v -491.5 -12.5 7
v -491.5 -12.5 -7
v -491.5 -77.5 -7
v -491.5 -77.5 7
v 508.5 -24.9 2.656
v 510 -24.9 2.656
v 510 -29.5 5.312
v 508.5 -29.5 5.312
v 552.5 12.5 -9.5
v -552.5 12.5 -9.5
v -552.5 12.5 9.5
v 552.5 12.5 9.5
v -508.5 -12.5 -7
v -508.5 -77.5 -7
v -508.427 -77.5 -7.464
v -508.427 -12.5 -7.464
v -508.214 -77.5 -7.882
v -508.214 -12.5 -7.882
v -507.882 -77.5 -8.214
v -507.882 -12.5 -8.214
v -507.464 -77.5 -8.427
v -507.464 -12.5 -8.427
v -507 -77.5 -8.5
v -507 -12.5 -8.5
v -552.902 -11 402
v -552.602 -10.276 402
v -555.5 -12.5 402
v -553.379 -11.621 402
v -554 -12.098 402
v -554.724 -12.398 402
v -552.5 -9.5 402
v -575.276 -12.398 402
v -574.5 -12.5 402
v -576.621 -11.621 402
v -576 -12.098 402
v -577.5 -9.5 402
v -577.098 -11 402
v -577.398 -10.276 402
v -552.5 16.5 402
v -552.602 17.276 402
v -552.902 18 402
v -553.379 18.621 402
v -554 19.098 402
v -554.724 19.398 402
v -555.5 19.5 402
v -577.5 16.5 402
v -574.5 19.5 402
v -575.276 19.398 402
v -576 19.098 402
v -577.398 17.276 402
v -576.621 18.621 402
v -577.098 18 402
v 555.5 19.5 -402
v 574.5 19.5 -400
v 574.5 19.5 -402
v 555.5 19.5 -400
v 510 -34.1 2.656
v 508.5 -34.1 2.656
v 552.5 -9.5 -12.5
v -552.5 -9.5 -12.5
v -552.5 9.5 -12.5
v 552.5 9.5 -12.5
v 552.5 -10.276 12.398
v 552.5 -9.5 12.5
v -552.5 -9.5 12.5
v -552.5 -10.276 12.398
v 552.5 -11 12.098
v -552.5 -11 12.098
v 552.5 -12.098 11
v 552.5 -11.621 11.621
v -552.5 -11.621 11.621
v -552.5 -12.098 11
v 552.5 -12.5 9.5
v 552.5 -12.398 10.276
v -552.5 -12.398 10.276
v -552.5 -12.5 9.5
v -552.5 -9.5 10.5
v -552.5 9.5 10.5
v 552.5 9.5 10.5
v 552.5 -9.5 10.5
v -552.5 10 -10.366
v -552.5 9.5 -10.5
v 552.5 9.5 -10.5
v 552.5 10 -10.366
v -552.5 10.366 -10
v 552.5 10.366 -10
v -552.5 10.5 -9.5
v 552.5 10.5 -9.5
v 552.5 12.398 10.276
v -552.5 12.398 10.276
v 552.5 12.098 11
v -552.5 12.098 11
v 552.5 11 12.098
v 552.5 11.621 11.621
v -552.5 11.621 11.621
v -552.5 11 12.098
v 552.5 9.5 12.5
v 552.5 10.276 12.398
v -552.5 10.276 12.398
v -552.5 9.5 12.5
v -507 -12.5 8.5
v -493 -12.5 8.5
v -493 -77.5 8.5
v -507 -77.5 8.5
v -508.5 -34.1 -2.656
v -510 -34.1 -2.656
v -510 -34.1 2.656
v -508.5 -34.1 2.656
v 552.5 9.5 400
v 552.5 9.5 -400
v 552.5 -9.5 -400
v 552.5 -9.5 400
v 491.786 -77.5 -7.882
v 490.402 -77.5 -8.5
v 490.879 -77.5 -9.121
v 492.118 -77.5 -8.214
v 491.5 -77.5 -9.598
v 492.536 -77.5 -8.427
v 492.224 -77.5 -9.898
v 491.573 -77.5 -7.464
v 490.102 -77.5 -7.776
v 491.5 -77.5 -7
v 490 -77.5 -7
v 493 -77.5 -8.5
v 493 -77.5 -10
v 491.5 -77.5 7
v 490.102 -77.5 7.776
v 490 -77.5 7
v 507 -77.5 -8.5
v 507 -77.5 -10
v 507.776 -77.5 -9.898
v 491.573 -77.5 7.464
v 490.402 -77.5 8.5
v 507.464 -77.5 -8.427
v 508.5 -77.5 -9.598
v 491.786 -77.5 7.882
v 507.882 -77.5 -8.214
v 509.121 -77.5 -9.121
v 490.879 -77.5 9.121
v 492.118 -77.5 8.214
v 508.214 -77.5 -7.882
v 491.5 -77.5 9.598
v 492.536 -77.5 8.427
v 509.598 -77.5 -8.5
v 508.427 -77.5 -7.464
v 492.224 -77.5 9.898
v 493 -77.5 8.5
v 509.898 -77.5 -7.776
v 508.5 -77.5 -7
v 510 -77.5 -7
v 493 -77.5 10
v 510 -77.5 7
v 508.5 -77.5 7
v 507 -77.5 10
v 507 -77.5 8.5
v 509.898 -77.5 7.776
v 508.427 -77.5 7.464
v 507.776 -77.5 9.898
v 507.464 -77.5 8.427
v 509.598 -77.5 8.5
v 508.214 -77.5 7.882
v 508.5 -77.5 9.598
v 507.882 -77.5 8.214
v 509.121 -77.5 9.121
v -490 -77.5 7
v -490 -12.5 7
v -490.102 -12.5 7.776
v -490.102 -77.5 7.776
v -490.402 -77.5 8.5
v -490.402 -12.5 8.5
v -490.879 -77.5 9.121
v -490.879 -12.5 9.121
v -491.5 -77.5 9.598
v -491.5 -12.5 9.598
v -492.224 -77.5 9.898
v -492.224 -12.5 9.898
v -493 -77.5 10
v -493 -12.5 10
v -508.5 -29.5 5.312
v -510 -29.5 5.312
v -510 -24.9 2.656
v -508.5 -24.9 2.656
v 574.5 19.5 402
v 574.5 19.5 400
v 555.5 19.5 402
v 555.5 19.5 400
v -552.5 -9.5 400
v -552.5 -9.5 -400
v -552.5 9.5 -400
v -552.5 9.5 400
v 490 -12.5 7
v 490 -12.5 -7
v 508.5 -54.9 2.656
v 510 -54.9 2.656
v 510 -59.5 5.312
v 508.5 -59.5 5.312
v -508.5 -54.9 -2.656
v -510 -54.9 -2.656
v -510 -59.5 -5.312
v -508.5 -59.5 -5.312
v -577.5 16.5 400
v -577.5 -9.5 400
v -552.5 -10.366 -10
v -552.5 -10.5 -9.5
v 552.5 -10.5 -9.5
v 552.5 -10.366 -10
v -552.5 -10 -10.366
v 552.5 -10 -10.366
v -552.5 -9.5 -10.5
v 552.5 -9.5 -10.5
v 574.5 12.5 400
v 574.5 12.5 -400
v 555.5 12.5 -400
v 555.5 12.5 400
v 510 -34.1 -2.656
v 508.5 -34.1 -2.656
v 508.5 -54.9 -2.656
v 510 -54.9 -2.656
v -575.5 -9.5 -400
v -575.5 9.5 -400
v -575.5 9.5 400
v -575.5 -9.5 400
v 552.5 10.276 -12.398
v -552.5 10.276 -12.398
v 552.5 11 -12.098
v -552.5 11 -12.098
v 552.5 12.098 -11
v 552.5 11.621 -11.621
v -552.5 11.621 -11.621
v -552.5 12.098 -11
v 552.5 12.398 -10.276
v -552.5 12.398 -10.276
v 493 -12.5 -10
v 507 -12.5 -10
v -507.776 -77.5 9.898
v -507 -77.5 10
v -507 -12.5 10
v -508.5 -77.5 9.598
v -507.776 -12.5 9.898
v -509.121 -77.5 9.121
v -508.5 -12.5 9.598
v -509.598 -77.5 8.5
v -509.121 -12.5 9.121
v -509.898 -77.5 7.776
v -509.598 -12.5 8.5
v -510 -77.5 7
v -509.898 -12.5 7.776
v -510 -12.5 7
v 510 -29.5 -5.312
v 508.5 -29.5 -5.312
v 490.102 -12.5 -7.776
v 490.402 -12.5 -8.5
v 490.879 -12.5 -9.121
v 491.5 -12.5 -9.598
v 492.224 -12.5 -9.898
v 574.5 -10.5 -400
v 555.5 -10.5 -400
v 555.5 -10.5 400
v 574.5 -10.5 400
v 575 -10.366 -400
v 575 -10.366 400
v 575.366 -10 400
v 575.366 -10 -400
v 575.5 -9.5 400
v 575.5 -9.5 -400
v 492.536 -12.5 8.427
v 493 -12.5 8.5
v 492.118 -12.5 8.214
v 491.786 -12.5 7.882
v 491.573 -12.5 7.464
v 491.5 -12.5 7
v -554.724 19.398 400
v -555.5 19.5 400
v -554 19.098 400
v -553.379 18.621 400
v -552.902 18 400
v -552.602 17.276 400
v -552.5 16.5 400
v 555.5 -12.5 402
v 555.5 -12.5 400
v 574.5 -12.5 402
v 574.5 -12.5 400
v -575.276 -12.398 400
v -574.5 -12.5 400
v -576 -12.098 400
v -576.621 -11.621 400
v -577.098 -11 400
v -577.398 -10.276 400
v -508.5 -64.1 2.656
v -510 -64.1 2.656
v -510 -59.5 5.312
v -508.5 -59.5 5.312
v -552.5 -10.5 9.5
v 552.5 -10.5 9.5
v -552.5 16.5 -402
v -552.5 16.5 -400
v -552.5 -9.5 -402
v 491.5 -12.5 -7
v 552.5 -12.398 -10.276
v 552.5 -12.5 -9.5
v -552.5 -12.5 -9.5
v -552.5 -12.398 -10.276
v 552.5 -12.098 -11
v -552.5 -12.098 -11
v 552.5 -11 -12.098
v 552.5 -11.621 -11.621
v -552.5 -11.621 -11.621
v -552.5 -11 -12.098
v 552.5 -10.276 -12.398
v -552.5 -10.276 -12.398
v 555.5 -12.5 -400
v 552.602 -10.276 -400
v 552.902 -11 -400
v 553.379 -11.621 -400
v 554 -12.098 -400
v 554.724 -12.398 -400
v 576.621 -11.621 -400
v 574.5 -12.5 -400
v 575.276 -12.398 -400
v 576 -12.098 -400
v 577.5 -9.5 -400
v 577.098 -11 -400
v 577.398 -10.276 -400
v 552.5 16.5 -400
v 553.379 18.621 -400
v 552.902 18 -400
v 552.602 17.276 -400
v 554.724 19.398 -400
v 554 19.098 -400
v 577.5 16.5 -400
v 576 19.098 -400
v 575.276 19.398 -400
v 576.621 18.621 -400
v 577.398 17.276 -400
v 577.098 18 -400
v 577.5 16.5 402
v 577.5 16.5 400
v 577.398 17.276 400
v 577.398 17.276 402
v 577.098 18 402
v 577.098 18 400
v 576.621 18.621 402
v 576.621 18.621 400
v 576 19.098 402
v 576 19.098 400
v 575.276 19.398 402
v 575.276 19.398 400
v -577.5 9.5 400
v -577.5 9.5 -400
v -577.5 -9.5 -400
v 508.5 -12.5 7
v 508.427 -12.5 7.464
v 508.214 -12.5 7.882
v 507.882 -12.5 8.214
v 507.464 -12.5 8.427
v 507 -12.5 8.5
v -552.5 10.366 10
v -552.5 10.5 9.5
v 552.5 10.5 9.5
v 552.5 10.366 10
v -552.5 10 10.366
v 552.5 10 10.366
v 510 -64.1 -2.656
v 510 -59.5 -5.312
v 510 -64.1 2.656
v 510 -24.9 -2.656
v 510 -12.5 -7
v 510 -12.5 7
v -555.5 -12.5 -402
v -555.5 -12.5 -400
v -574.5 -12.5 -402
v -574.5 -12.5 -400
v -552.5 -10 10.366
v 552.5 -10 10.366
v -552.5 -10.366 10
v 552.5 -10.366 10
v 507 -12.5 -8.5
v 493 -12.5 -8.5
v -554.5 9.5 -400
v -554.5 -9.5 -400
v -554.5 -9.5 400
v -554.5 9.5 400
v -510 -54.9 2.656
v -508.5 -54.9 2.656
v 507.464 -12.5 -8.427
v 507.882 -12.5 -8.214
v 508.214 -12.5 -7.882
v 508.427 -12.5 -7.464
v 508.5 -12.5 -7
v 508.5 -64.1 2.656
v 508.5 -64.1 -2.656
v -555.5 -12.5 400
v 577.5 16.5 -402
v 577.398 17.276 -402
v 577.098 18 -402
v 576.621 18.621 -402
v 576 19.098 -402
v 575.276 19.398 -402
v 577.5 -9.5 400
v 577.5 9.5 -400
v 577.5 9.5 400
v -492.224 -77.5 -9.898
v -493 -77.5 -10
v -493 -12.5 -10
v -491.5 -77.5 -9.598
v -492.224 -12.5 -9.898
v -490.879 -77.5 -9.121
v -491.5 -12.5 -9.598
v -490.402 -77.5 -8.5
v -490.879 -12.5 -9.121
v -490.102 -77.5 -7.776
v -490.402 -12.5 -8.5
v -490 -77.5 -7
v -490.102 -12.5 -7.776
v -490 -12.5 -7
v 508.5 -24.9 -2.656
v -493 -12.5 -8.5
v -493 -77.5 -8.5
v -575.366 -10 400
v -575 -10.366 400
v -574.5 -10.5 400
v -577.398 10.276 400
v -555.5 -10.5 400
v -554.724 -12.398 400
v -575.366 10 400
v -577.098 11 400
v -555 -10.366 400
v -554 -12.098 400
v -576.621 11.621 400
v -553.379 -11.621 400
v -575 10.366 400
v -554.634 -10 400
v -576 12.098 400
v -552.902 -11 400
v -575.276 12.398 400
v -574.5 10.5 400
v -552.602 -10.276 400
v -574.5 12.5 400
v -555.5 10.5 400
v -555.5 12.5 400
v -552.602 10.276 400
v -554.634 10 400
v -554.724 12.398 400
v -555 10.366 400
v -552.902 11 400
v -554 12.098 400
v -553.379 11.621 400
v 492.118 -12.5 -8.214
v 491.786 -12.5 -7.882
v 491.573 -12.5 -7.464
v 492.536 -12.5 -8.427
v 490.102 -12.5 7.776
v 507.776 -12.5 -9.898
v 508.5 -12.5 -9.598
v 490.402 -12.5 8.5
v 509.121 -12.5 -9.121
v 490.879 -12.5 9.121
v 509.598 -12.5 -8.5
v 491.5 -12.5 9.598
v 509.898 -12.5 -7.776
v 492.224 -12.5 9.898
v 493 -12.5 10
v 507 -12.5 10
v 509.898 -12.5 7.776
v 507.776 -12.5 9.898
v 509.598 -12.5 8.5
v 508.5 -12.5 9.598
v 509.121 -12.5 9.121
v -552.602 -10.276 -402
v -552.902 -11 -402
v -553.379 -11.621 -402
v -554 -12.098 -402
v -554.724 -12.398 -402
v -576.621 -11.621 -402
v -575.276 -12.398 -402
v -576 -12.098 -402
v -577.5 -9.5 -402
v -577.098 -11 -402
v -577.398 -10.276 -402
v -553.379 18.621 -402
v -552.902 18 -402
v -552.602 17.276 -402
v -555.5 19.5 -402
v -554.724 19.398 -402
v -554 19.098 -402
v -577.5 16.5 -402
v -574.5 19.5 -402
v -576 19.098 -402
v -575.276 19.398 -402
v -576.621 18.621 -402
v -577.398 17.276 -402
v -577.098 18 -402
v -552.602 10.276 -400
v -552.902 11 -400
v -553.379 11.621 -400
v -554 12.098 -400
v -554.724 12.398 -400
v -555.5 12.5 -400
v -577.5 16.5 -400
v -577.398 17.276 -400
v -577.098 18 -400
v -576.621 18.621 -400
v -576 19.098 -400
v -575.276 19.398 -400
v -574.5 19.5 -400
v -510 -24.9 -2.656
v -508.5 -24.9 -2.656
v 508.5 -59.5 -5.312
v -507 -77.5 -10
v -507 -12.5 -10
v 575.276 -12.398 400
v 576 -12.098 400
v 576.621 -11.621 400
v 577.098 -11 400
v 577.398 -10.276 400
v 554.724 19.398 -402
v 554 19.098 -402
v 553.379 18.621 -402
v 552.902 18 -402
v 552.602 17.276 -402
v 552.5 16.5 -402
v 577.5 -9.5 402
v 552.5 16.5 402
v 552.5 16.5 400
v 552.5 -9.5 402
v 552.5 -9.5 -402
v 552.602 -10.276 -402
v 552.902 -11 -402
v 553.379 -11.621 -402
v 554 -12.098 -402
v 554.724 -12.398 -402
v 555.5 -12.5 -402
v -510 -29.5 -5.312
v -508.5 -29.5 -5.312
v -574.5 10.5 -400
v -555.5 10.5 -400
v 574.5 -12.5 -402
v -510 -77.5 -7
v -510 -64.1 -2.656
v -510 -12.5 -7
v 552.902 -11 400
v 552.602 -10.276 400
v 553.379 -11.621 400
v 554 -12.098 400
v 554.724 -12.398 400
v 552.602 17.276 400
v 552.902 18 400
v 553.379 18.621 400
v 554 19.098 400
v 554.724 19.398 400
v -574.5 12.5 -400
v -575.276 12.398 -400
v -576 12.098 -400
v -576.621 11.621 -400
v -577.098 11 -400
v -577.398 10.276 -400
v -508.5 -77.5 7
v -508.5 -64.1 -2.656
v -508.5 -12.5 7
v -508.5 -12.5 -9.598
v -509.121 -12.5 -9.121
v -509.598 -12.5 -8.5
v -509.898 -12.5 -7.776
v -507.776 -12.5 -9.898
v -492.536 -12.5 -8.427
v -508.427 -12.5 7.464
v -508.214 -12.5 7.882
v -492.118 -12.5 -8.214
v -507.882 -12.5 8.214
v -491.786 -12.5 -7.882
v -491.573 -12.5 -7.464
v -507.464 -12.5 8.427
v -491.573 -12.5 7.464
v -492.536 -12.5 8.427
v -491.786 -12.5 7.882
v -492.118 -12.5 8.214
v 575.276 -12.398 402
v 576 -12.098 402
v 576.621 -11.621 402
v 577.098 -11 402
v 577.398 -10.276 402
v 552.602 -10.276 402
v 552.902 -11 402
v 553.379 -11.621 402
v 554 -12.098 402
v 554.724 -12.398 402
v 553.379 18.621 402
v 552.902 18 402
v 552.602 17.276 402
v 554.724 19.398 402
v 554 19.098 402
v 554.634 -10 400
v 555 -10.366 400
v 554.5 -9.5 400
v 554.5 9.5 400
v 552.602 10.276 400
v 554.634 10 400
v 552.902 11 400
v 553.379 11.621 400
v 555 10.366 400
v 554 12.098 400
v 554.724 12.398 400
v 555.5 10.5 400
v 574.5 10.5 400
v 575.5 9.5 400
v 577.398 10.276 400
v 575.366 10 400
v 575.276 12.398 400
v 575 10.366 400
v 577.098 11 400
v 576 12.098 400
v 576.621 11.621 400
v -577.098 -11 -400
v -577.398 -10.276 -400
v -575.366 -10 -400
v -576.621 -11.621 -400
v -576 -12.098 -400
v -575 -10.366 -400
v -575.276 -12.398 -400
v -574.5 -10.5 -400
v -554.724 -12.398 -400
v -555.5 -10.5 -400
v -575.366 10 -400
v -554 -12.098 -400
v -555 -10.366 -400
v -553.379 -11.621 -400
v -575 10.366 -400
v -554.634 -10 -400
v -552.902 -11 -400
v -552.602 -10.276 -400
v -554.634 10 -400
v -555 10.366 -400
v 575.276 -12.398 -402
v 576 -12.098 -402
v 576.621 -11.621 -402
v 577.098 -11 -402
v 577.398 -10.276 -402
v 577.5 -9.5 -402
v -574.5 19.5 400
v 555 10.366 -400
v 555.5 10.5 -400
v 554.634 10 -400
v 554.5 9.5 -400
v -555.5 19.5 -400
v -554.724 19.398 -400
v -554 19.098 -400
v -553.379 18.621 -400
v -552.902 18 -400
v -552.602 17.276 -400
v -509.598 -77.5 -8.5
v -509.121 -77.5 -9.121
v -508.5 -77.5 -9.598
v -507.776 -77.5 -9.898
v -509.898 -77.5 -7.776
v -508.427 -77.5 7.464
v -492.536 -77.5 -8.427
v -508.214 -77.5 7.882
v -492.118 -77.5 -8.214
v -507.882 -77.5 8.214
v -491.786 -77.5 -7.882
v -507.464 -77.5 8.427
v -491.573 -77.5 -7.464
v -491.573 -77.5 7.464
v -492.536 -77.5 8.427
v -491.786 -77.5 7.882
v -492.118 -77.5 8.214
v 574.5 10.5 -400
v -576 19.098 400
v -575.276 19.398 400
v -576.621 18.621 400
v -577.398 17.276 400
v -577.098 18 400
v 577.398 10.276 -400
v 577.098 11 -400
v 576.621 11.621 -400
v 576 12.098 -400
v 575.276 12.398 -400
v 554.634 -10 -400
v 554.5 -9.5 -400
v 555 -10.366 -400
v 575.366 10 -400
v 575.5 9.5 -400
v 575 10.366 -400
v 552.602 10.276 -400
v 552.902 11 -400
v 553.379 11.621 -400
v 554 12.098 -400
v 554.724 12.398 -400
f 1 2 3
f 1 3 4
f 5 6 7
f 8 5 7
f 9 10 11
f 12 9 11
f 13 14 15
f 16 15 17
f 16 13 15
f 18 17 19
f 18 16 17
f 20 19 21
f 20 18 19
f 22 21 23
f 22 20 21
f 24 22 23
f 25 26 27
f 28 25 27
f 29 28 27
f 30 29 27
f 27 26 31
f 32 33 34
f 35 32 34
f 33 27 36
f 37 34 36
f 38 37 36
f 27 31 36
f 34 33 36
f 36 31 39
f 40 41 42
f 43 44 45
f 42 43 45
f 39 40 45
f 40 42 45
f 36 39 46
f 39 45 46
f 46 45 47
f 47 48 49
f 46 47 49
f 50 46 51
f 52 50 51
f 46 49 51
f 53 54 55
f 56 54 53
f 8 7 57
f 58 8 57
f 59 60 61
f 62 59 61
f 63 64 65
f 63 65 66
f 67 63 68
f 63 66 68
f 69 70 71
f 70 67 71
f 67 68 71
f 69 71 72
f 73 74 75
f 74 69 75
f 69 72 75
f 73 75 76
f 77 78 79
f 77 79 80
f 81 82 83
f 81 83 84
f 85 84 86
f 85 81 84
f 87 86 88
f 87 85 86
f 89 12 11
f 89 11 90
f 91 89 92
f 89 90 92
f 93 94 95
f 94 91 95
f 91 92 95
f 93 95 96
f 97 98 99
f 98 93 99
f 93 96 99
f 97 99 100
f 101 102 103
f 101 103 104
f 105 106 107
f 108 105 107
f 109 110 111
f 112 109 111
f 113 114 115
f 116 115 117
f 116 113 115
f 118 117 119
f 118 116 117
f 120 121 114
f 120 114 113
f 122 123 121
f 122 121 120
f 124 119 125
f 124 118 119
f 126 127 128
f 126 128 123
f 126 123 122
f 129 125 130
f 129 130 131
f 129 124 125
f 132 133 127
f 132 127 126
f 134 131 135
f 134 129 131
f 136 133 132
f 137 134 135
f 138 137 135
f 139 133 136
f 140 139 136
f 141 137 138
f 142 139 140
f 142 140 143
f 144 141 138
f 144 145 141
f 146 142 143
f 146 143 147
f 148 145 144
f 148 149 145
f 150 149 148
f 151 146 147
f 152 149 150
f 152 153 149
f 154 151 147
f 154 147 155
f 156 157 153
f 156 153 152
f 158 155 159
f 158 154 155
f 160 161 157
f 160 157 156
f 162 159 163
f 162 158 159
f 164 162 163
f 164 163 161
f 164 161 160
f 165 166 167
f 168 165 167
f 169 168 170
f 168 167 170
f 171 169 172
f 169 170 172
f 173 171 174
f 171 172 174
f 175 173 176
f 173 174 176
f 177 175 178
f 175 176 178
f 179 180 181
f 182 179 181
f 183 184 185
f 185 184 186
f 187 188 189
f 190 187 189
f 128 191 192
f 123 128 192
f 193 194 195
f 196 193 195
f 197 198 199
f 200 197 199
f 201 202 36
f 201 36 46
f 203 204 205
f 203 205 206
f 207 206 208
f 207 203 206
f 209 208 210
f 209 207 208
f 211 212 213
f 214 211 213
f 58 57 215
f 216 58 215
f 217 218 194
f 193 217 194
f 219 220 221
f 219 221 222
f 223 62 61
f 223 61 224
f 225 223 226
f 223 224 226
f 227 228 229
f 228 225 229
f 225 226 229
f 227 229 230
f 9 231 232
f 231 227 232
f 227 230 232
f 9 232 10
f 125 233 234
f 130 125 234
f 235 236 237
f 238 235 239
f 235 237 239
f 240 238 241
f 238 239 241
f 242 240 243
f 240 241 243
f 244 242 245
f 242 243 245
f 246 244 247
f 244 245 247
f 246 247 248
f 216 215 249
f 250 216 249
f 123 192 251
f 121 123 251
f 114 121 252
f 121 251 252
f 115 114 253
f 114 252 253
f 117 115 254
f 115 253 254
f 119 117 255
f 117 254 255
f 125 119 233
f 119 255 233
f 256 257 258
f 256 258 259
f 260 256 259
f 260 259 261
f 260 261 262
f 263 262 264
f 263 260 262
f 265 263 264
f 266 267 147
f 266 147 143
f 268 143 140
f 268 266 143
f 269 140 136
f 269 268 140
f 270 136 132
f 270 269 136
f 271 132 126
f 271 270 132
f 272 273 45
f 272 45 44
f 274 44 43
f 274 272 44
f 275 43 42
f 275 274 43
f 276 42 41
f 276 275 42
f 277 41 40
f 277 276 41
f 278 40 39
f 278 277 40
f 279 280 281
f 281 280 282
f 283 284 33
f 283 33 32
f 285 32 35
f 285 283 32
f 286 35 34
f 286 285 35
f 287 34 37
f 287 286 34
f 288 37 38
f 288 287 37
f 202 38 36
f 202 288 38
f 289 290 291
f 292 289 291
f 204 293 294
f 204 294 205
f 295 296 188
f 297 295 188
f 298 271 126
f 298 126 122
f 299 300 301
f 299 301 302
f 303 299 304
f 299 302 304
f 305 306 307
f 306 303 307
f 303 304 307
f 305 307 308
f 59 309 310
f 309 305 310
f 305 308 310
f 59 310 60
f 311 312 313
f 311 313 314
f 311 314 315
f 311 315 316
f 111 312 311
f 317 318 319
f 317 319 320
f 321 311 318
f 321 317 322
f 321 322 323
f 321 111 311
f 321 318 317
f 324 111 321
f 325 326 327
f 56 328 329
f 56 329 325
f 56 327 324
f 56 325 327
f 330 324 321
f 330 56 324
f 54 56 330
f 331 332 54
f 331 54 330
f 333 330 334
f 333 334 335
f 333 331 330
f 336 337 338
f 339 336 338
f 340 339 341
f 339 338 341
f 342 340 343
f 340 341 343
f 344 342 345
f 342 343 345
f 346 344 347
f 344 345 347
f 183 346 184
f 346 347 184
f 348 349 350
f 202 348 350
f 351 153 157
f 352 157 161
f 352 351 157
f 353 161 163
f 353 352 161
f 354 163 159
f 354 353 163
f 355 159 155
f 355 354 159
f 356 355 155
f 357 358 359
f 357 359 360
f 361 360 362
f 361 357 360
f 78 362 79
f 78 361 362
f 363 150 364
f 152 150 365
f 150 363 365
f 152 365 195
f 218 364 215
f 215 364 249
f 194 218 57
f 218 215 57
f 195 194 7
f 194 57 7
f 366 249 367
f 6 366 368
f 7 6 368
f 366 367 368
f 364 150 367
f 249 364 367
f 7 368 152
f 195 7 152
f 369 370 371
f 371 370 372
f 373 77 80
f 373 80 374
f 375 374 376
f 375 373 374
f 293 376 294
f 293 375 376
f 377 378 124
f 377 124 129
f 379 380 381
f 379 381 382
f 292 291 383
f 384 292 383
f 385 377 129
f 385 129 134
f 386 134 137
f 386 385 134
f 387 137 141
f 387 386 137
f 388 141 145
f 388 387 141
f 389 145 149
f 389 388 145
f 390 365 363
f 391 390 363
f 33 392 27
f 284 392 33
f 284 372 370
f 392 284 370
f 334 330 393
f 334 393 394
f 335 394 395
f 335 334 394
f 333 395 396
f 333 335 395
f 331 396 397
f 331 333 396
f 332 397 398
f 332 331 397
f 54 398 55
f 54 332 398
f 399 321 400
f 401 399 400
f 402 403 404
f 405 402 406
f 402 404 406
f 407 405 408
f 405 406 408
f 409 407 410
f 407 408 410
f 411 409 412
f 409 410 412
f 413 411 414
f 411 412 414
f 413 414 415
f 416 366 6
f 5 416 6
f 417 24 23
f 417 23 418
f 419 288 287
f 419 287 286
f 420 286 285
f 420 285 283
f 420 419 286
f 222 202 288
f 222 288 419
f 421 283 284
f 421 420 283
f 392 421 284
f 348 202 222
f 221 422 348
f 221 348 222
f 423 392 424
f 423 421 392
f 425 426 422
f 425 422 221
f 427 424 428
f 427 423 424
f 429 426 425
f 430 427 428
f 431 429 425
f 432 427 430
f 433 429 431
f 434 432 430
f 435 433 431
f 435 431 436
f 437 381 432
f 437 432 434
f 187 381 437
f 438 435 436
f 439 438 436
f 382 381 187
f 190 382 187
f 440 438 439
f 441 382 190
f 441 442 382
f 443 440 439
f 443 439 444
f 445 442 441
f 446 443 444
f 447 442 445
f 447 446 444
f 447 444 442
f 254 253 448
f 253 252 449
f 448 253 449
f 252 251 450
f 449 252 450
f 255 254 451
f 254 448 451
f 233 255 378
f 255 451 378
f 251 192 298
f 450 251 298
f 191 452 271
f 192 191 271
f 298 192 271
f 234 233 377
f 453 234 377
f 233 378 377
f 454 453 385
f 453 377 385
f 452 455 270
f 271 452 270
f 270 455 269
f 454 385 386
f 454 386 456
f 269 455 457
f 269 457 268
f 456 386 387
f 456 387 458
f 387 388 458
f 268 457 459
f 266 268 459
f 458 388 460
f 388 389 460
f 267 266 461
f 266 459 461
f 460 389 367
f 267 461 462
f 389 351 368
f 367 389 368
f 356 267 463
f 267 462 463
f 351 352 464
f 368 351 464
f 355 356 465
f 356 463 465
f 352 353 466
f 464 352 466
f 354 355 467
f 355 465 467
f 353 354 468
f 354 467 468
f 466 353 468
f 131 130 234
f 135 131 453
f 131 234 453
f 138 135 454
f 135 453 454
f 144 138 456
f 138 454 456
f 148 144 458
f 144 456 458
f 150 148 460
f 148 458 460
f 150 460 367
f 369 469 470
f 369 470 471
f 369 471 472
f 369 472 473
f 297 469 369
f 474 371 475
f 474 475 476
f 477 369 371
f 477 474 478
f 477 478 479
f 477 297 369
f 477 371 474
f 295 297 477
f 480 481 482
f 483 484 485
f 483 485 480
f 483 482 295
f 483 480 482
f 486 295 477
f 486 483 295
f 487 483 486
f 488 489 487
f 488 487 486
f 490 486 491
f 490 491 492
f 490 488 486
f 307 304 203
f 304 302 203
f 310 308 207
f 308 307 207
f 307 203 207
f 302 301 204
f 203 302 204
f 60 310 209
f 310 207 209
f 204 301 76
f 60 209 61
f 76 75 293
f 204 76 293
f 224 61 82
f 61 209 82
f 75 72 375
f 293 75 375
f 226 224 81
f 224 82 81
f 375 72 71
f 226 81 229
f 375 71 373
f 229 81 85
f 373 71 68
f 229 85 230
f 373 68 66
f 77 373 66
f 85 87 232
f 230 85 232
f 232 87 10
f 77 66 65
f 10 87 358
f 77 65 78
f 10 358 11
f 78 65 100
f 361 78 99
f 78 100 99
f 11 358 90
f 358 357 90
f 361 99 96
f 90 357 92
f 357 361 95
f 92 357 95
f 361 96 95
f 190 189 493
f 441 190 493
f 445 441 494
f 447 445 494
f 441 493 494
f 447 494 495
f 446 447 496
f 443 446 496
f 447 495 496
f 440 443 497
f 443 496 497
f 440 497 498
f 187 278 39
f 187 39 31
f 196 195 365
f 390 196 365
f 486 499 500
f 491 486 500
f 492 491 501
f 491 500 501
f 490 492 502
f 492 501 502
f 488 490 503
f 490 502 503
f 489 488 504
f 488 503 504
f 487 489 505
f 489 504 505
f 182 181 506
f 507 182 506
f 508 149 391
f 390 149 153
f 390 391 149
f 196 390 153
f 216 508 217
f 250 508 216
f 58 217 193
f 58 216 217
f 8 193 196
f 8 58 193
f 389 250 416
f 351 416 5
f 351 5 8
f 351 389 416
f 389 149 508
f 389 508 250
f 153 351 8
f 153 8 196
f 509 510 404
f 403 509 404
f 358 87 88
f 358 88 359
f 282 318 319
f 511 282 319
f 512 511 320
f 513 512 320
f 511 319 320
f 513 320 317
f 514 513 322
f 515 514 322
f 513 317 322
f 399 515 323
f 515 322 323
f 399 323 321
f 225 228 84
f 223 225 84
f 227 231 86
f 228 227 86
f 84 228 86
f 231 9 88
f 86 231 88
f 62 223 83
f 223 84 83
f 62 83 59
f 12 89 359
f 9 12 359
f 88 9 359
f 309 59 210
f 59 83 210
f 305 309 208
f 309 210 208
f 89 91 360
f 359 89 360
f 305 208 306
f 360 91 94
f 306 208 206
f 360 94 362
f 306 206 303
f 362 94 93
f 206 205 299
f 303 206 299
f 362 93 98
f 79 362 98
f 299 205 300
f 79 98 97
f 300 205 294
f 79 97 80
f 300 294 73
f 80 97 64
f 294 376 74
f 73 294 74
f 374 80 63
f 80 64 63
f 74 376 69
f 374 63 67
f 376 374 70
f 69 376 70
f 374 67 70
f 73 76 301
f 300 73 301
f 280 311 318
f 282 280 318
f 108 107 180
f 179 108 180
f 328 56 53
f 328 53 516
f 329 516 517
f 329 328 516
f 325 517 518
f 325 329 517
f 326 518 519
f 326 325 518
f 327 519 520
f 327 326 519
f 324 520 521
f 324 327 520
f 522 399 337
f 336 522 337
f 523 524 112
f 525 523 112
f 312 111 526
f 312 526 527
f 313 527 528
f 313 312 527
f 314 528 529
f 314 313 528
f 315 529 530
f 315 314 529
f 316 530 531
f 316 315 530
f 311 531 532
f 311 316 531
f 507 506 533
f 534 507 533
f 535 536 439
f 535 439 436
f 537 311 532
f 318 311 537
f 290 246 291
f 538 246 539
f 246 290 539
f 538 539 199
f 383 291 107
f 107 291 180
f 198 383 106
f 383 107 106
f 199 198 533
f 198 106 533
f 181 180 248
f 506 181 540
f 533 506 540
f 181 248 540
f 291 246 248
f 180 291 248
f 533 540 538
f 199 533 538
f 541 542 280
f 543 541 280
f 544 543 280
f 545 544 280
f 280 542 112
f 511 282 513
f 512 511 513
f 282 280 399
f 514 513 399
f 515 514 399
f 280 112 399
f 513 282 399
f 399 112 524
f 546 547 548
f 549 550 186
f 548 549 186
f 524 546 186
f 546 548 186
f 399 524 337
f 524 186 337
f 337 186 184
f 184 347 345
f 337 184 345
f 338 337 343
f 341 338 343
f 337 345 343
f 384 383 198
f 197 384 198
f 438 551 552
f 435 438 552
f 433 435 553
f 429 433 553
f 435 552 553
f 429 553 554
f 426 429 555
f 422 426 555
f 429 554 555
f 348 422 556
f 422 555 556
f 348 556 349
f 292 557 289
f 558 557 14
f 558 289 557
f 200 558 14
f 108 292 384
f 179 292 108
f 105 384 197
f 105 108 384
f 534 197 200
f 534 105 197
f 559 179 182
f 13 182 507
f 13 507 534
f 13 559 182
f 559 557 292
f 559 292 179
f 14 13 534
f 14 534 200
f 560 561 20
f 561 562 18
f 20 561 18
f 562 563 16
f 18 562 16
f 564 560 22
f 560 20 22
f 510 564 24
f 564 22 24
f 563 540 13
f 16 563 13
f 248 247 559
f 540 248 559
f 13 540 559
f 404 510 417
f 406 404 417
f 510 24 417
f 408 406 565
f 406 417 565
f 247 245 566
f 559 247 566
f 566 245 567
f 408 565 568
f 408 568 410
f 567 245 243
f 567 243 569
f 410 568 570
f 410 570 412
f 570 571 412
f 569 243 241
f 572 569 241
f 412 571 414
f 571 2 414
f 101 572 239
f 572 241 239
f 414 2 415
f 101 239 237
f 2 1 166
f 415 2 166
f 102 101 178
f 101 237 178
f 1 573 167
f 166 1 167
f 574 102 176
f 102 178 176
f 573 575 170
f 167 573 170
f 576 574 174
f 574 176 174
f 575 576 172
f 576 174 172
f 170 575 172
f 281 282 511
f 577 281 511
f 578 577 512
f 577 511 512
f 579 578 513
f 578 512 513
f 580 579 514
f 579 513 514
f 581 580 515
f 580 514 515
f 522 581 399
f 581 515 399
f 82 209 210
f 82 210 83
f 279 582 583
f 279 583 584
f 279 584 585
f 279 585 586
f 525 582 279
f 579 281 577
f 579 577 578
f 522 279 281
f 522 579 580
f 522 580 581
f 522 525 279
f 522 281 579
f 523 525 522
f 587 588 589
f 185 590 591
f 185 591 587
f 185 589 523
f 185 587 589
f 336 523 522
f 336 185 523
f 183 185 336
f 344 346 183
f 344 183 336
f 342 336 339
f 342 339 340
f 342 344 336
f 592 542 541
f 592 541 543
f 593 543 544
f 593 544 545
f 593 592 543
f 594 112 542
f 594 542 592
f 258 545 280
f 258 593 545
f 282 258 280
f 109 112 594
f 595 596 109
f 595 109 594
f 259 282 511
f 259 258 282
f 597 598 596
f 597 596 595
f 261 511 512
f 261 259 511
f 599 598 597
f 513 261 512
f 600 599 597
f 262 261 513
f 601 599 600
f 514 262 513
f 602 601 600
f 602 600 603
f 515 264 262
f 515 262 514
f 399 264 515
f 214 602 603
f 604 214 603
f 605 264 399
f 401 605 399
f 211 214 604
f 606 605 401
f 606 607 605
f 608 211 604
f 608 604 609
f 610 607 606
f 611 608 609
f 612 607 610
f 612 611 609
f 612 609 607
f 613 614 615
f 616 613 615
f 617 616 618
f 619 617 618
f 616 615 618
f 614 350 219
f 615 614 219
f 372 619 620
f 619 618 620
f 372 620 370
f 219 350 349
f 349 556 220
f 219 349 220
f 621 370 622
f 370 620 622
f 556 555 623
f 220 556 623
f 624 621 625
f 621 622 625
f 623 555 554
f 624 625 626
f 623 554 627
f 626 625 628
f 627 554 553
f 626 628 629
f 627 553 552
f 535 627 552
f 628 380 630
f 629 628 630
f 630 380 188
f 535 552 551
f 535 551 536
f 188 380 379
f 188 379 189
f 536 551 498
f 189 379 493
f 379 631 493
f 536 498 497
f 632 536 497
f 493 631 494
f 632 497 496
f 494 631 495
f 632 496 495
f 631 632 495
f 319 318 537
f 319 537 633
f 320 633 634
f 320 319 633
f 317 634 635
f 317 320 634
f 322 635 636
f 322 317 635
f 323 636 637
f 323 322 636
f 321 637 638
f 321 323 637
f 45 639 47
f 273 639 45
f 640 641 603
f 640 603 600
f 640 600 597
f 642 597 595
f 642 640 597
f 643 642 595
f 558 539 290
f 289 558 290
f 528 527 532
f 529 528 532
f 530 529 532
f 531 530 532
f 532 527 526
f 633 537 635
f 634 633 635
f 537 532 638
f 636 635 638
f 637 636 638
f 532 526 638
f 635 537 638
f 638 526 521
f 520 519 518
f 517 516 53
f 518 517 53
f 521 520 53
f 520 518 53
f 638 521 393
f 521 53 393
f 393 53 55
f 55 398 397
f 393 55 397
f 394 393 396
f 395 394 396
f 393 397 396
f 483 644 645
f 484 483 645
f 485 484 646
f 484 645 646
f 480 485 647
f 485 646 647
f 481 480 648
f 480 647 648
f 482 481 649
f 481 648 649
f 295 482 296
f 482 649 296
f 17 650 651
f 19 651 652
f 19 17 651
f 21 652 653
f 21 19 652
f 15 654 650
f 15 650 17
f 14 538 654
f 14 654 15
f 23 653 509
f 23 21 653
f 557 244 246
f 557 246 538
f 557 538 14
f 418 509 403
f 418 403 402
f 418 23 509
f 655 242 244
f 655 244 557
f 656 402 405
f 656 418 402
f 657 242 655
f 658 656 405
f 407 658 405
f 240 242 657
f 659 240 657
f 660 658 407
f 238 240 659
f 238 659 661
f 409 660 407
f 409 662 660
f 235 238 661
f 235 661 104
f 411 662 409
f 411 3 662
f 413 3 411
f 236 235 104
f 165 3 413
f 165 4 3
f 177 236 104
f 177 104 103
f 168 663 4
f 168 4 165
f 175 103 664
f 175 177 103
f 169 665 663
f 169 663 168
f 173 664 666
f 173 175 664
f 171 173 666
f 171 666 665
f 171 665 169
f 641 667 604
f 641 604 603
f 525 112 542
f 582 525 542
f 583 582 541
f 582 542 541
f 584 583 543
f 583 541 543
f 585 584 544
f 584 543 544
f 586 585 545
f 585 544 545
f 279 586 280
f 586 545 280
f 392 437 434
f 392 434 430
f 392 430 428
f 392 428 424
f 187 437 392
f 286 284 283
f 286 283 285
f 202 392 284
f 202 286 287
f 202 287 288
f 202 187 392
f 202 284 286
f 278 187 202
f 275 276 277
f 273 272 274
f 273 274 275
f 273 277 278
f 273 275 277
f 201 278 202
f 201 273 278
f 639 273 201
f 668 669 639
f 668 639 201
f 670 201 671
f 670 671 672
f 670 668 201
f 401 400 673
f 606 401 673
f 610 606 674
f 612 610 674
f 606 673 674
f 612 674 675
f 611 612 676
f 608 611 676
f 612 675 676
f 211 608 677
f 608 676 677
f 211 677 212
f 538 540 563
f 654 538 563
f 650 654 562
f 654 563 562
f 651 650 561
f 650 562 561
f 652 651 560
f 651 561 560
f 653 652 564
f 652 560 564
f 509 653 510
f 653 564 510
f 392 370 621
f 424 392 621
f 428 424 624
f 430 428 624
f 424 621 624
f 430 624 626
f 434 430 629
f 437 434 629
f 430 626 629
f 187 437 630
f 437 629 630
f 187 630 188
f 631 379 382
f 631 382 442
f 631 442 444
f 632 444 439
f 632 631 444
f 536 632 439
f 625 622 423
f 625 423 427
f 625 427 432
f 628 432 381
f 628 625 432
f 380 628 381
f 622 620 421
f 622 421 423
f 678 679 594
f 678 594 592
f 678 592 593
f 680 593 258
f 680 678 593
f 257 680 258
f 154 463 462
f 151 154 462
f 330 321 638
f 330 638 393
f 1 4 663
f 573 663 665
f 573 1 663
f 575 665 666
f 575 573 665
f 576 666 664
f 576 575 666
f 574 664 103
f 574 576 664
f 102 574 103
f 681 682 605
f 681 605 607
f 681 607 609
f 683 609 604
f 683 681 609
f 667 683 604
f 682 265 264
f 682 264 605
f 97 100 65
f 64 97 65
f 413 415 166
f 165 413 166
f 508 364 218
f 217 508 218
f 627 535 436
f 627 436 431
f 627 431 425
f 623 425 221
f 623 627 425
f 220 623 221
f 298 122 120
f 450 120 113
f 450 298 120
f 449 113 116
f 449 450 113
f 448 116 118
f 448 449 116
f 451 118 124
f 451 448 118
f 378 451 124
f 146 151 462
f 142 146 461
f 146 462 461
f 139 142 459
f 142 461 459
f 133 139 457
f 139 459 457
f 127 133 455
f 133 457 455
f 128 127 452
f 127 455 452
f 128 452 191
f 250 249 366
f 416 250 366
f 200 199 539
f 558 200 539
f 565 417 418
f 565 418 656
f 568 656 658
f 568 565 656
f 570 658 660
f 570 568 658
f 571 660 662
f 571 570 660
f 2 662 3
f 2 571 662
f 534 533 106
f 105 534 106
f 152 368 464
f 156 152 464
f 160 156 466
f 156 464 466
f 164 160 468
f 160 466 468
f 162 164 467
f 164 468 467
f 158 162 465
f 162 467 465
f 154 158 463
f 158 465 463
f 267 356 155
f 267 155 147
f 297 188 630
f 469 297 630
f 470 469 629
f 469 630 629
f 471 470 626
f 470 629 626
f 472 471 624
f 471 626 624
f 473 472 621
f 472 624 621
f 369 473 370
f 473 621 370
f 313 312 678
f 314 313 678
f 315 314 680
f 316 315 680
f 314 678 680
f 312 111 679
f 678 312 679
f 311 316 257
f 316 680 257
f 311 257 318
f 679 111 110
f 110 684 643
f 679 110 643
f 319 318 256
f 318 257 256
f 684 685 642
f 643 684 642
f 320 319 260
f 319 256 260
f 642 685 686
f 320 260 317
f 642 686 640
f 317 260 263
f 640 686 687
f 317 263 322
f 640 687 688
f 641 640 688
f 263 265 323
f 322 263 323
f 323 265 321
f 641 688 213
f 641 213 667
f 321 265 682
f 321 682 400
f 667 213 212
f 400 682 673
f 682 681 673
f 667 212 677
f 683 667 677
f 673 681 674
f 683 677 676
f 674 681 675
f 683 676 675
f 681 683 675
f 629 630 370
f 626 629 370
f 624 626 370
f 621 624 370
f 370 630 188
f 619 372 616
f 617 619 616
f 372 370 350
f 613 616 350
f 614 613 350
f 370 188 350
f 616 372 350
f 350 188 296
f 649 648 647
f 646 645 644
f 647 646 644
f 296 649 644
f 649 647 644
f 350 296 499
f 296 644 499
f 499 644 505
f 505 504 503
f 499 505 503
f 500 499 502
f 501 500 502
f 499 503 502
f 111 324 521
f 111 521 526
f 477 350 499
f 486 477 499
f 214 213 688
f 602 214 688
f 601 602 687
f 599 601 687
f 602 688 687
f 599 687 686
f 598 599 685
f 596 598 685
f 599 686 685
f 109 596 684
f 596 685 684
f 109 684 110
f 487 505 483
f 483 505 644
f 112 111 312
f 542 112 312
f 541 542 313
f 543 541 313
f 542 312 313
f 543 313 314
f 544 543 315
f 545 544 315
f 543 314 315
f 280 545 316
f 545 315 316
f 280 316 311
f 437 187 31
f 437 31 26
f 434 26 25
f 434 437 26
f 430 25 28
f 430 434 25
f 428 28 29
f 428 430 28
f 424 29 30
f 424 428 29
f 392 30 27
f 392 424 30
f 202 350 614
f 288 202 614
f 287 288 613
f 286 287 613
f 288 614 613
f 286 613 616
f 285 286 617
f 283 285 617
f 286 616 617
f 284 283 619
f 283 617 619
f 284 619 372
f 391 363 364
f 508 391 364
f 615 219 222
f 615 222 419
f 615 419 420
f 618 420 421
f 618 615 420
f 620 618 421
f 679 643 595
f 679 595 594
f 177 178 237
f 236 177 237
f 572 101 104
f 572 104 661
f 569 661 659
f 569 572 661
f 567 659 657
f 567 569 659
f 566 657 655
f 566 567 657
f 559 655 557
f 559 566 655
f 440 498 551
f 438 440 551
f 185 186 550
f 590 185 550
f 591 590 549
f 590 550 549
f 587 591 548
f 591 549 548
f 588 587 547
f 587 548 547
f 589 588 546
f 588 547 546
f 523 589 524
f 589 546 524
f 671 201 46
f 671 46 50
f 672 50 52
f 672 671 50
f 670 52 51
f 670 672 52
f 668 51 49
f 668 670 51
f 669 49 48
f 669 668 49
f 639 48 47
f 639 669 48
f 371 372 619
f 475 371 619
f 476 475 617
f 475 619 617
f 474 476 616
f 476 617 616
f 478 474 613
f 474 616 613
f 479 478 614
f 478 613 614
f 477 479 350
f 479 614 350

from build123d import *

# Parameters (mm, degrees)
F_2_X_2_X_0_25_1_DEPTH   = 800
F_2_X_2_X_0_25_1_2_DEPTH = 800
F_2_X_2_X_0_25_1_3_DEPTH = 1132
F_2_X_2_X_0_25_2_DEPTH   = 77.5
F_2_X_2_X_0_25_2_2_DEPTH = 77.5
EXTRUDE_1_DEPTH          = 2
CUT_EXTRUDE_3_DEPTH      = 1.5
CUT_EXTRUDE_4_DEPTH      = 1.5


with BuildPart() as part:
    # Sketch1 → Квадратная труба 2 X 2 X 0.25(1) (new body)
    with BuildSketch(Plane(origin=(-565, 0, -400), x_dir=(1, 0, 0), z_dir=(0, 0, 1))):
        with BuildLine():
            Line((-9.5, -12.5), (9.5, -12.5))
            ThreePointArc((9.5, -12.5), (11.621320344, -11.621320344), (12.5, -9.5))
            Line((12.5, -9.5), (12.5, 9.5))
            ThreePointArc((12.5, 9.5), (11.621320344, 11.621320344), (9.5, 12.5))
            Line((9.5, 12.5), (-9.5, 12.5))
            ThreePointArc((-9.5, 12.5), (-11.621320344, 11.621320344), (-12.5, 9.5))
            Line((-12.5, 9.5), (-12.5, -9.5))
            ThreePointArc((-12.5, -9.5), (-11.621320344, -11.621320344), (-9.5, -12.5))
        make_face()
        with BuildLine():
            Line((-9.5, -10.5), (9.5, -10.5))
            ThreePointArc((9.5, -10.5), (10.207106781, -10.207106781), (10.5, -9.5))
            Line((10.5, -9.5), (10.5, 9.5))
            ThreePointArc((10.5, 9.5), (10.207106781, 10.207106781), (9.5, 10.5))
            Line((9.5, 10.5), (-9.5, 10.5))
            ThreePointArc((-9.5, 10.5), (-10.207106781, 10.207106781), (-10.5, 9.5))
            Line((-10.5, 9.5), (-10.5, -9.5))
            ThreePointArc((-10.5, -9.5), (-10.207106781, -10.207106781), (-9.5, -10.5))
        make_face(mode=Mode.SUBTRACT)
    extrude(amount=F_2_X_2_X_0_25_1_DEPTH)


with BuildPart() as body_2:
    # Sketch1 on segment 2 (carried to segment 2) → 2 X 2 X 0.25_1 2 (new body)
    with BuildSketch(Plane(origin=(565, 0, -400), x_dir=(1, 0, 0), z_dir=(0, 0, 1))):
        with BuildLine():
            Line((-9.5, -12.5), (9.5, -12.5))
            ThreePointArc((9.5, -12.5), (11.621320344, -11.621320344), (12.5, -9.5))
            Line((12.5, -9.5), (12.5, 9.5))
            ThreePointArc((12.5, 9.5), (11.621320344, 11.621320344), (9.5, 12.5))
            Line((9.5, 12.5), (-9.5, 12.5))
            ThreePointArc((-9.5, 12.5), (-11.621320344, 11.621320344), (-12.5, 9.5))
            Line((-12.5, 9.5), (-12.5, -9.5))
            ThreePointArc((-12.5, -9.5), (-11.621320344, -11.621320344), (-9.5, -12.5))
        make_face()
        with BuildLine():
            Line((-9.5, -10.5), (9.5, -10.5))
            ThreePointArc((9.5, -10.5), (10.207106781, -10.207106781), (10.5, -9.5))
            Line((10.5, -9.5), (10.5, 9.5))
            ThreePointArc((10.5, 9.5), (10.207106781, 10.207106781), (9.5, 10.5))
            Line((9.5, 10.5), (-9.5, 10.5))
            ThreePointArc((-9.5, 10.5), (-10.207106781, 10.207106781), (-10.5, 9.5))
            Line((-10.5, 9.5), (-10.5, -9.5))
            ThreePointArc((-10.5, -9.5), (-10.207106781, -10.207106781), (-9.5, -10.5))
        make_face(mode=Mode.SUBTRACT)
    extrude(amount=F_2_X_2_X_0_25_1_2_DEPTH)


with BuildPart() as body_3:
    # Sketch1 on segment 3 (carried to segment 3) → 2 X 2 X 0.25_1 3 (new body)
    with BuildSketch(Plane(origin=(-566, 0, 0), x_dir=(0, 0, -1), z_dir=(1, 0, 0))):
        with BuildLine():
            Line((-9.5, -12.5), (9.5, -12.5))
            ThreePointArc((9.5, -12.5), (11.621320344, -11.621320344), (12.5, -9.5))
            Line((12.5, -9.5), (12.5, 9.5))
            ThreePointArc((12.5, 9.5), (11.621320344, 11.621320344), (9.5, 12.5))
            Line((9.5, 12.5), (-9.5, 12.5))
            ThreePointArc((-9.5, 12.5), (-11.621320344, 11.621320344), (-12.5, 9.5))
            Line((-12.5, 9.5), (-12.5, -9.5))
            ThreePointArc((-12.5, -9.5), (-11.621320344, -11.621320344), (-9.5, -12.5))
        make_face()
        with BuildLine():
            Line((-9.5, -10.5), (9.5, -10.5))
            ThreePointArc((9.5, -10.5), (10.207106781, -10.207106781), (10.5, -9.5))
            Line((10.5, -9.5), (10.5, 9.5))
            ThreePointArc((10.5, 9.5), (10.207106781, 10.207106781), (9.5, 10.5))
            Line((9.5, 10.5), (-9.5, 10.5))
            ThreePointArc((-9.5, 10.5), (-10.207106781, 10.207106781), (-10.5, 9.5))
            Line((-10.5, 9.5), (-10.5, -9.5))
            ThreePointArc((-10.5, -9.5), (-10.207106781, -10.207106781), (-9.5, -10.5))
        make_face(mode=Mode.SUBTRACT)
    extrude(amount=F_2_X_2_X_0_25_1_3_DEPTH)

    # 2 X 2 X 0.25_1 3 end butt 1
    split(bisect_by=Plane.YZ.offset(-552.5), keep=Keep.TOP)

    # 2 X 2 X 0.25_1 3 end butt 2
    split(bisect_by=Plane(origin=(552.5, 0, 0), x_dir=(0, -1, 0), z_dir=(-1, 0, 0)), keep=Keep.TOP)


with BuildPart() as body_4:
    # Sketch11 → Квадратная труба 2 X 2 X 0.25(2) (new body)
    with BuildSketch(Plane(origin=(-500, 0, 0), x_dir=(1, 0, 0), z_dir=(0, -1, 0))):
        with BuildLine():
            Line((-7, -10), (7, -10))
            ThreePointArc((7, -10), (9.121320344, -9.121320344), (10, -7))
            Line((10, -7), (10, 7))
            ThreePointArc((10, 7), (9.121320344, 9.121320344), (7, 10))
            Line((7, 10), (-7, 10))
            ThreePointArc((-7, 10), (-9.121320344, 9.121320344), (-10, 7))
            Line((-10, 7), (-10, -7))
            ThreePointArc((-10, -7), (-9.121320344, -9.121320344), (-7, -10))
        make_face()
        with BuildLine():
            Line((-7, -8.5), (7, -8.5))
            ThreePointArc((7, -8.5), (8.060660172, -8.060660172), (8.5, -7))
            Line((8.5, -7), (8.5, 7))
            ThreePointArc((8.5, 7), (8.060660172, 8.060660172), (7, 8.5))
            Line((7, 8.5), (-7, 8.5))
            ThreePointArc((-7, 8.5), (-8.060660172, 8.060660172), (-8.5, 7))
            Line((-8.5, 7), (-8.5, -7))
            ThreePointArc((-8.5, -7), (-8.060660172, -8.060660172), (-7, -8.5))
        make_face(mode=Mode.SUBTRACT)
    extrude(amount=F_2_X_2_X_0_25_2_DEPTH)

    # Weld Trim 2
    split(bisect_by=Plane.XZ.offset(12.5), keep=Keep.TOP)

    # Эскиз8 → Вырез-Вытянуть4 (cut)
    with BuildSketch(Plane.ZY.offset(510)):
        Polygon((2.655811238, -34.1), (5.311622477, -29.5), (2.655811238, -24.9), (-2.655811238, -24.9), (-5.311622477, -29.5), (-2.655811238, -34.1), align=None)
        Polygon((2.655811238, -64.1), (5.311622477, -59.5), (2.655811238, -54.9), (-2.655811238, -54.9), (-5.311622477, -59.5), (-2.655811238, -64.1), align=None)
    extrude(amount=-CUT_EXTRUDE_4_DEPTH, mode=Mode.SUBTRACT)


with BuildPart() as body_5:
    # Sketch11 on segment 2 (carried to segment 2) → 2 X 2 X 0.25_2 2 (new body)
    with BuildSketch(Plane(origin=(500, 0, 0), x_dir=(1, 0, 0), z_dir=(0, -1, 0))):
        with BuildLine():
            Line((-7, -10), (7, -10))
            ThreePointArc((7, -10), (9.121320344, -9.121320344), (10, -7))
            Line((10, -7), (10, 7))
            ThreePointArc((10, 7), (9.121320344, 9.121320344), (7, 10))
            Line((7, 10), (-7, 10))
            ThreePointArc((-7, 10), (-9.121320344, 9.121320344), (-10, 7))
            Line((-10, 7), (-10, -7))
            ThreePointArc((-10, -7), (-9.121320344, -9.121320344), (-7, -10))
        make_face()
        with BuildLine():
            Line((-7, -8.5), (7, -8.5))
            ThreePointArc((7, -8.5), (8.060660172, -8.060660172), (8.5, -7))
            Line((8.5, -7), (8.5, 7))
            ThreePointArc((8.5, 7), (8.060660172, 8.060660172), (7, 8.5))
            Line((7, 8.5), (-7, 8.5))
            ThreePointArc((-7, 8.5), (-8.060660172, 8.060660172), (-8.5, 7))
            Line((-8.5, 7), (-8.5, -7))
            ThreePointArc((-8.5, -7), (-8.060660172, -8.060660172), (-7, -8.5))
        make_face(mode=Mode.SUBTRACT)
    extrude(amount=F_2_X_2_X_0_25_2_2_DEPTH)

    # Weld Trim 2
    split(bisect_by=Plane.XZ.offset(12.5), keep=Keep.TOP)

    # Эскиз7 → Вырез-Вытянуть3 (cut)
    with BuildSketch(Plane(origin=(510, 0, 0), x_dir=(0, 0, -1), z_dir=(1, 0, 0))):
        Polygon((5.311622477, -29.5), (2.655811238, -24.9), (-2.655811238, -24.9), (-5.311622477, -29.5), (-2.655811238, -34.1), (2.655811238, -34.1), align=None)
        Polygon((5.311622477, -59.5), (2.655811238, -54.9), (-2.655811238, -54.9), (-5.311622477, -59.5), (-2.655811238, -64.1), (2.655811238, -64.1), align=None)
    extrude(amount=-CUT_EXTRUDE_3_DEPTH, mode=Mode.SUBTRACT)


with BuildPart() as body_6:
    # Эскиз5 → Бобышка-Вытянуть1 (new body)
    with BuildSketch(Plane.XY.offset(400)):
        with BuildLine():
            Line((-574.5, 19.5), (-555.5, 19.5))
            ThreePointArc((-555.5, 19.5), (-553.378679656, 18.621320344), (-552.5, 16.5))
            Line((-552.5, 16.5), (-552.5, -9.5))
            ThreePointArc((-552.5, -9.5), (-553.378679656, -11.621320344), (-555.5, -12.5))
            Line((-555.5, -12.5), (-574.5, -12.5))
            ThreePointArc((-574.5, -12.5), (-576.621320344, -11.621320344), (-577.5, -9.5))
            Line((-577.5, -9.5), (-577.5, 16.5))
            ThreePointArc((-577.5, 16.5), (-576.621320344, 18.621320344), (-574.5, 19.5))
        make_face()
    extrude(amount=EXTRUDE_1_DEPTH)


with BuildPart() as body_7:
    # Зеркальное отражение2: mirrored copy
    add(body_6.part.mirror(Plane(origin=(0, 0, 0), x_dir=(0, 0, 1), z_dir=(1, 0, 0))))


with BuildPart() as body_8:
    # Зеркальное отражение3: mirrored copy
    add(body_6.part.mirror(Plane.XY))


with BuildPart() as body_9:
    # Mirror 3 2: mirrored copy
    add(body_7.part.mirror(Plane.XY))


solid = Compound([part.part, body_2.part, body_3.part, body_4.part, body_5.part, body_6.part, body_7.part, body_8.part, body_9.part])
